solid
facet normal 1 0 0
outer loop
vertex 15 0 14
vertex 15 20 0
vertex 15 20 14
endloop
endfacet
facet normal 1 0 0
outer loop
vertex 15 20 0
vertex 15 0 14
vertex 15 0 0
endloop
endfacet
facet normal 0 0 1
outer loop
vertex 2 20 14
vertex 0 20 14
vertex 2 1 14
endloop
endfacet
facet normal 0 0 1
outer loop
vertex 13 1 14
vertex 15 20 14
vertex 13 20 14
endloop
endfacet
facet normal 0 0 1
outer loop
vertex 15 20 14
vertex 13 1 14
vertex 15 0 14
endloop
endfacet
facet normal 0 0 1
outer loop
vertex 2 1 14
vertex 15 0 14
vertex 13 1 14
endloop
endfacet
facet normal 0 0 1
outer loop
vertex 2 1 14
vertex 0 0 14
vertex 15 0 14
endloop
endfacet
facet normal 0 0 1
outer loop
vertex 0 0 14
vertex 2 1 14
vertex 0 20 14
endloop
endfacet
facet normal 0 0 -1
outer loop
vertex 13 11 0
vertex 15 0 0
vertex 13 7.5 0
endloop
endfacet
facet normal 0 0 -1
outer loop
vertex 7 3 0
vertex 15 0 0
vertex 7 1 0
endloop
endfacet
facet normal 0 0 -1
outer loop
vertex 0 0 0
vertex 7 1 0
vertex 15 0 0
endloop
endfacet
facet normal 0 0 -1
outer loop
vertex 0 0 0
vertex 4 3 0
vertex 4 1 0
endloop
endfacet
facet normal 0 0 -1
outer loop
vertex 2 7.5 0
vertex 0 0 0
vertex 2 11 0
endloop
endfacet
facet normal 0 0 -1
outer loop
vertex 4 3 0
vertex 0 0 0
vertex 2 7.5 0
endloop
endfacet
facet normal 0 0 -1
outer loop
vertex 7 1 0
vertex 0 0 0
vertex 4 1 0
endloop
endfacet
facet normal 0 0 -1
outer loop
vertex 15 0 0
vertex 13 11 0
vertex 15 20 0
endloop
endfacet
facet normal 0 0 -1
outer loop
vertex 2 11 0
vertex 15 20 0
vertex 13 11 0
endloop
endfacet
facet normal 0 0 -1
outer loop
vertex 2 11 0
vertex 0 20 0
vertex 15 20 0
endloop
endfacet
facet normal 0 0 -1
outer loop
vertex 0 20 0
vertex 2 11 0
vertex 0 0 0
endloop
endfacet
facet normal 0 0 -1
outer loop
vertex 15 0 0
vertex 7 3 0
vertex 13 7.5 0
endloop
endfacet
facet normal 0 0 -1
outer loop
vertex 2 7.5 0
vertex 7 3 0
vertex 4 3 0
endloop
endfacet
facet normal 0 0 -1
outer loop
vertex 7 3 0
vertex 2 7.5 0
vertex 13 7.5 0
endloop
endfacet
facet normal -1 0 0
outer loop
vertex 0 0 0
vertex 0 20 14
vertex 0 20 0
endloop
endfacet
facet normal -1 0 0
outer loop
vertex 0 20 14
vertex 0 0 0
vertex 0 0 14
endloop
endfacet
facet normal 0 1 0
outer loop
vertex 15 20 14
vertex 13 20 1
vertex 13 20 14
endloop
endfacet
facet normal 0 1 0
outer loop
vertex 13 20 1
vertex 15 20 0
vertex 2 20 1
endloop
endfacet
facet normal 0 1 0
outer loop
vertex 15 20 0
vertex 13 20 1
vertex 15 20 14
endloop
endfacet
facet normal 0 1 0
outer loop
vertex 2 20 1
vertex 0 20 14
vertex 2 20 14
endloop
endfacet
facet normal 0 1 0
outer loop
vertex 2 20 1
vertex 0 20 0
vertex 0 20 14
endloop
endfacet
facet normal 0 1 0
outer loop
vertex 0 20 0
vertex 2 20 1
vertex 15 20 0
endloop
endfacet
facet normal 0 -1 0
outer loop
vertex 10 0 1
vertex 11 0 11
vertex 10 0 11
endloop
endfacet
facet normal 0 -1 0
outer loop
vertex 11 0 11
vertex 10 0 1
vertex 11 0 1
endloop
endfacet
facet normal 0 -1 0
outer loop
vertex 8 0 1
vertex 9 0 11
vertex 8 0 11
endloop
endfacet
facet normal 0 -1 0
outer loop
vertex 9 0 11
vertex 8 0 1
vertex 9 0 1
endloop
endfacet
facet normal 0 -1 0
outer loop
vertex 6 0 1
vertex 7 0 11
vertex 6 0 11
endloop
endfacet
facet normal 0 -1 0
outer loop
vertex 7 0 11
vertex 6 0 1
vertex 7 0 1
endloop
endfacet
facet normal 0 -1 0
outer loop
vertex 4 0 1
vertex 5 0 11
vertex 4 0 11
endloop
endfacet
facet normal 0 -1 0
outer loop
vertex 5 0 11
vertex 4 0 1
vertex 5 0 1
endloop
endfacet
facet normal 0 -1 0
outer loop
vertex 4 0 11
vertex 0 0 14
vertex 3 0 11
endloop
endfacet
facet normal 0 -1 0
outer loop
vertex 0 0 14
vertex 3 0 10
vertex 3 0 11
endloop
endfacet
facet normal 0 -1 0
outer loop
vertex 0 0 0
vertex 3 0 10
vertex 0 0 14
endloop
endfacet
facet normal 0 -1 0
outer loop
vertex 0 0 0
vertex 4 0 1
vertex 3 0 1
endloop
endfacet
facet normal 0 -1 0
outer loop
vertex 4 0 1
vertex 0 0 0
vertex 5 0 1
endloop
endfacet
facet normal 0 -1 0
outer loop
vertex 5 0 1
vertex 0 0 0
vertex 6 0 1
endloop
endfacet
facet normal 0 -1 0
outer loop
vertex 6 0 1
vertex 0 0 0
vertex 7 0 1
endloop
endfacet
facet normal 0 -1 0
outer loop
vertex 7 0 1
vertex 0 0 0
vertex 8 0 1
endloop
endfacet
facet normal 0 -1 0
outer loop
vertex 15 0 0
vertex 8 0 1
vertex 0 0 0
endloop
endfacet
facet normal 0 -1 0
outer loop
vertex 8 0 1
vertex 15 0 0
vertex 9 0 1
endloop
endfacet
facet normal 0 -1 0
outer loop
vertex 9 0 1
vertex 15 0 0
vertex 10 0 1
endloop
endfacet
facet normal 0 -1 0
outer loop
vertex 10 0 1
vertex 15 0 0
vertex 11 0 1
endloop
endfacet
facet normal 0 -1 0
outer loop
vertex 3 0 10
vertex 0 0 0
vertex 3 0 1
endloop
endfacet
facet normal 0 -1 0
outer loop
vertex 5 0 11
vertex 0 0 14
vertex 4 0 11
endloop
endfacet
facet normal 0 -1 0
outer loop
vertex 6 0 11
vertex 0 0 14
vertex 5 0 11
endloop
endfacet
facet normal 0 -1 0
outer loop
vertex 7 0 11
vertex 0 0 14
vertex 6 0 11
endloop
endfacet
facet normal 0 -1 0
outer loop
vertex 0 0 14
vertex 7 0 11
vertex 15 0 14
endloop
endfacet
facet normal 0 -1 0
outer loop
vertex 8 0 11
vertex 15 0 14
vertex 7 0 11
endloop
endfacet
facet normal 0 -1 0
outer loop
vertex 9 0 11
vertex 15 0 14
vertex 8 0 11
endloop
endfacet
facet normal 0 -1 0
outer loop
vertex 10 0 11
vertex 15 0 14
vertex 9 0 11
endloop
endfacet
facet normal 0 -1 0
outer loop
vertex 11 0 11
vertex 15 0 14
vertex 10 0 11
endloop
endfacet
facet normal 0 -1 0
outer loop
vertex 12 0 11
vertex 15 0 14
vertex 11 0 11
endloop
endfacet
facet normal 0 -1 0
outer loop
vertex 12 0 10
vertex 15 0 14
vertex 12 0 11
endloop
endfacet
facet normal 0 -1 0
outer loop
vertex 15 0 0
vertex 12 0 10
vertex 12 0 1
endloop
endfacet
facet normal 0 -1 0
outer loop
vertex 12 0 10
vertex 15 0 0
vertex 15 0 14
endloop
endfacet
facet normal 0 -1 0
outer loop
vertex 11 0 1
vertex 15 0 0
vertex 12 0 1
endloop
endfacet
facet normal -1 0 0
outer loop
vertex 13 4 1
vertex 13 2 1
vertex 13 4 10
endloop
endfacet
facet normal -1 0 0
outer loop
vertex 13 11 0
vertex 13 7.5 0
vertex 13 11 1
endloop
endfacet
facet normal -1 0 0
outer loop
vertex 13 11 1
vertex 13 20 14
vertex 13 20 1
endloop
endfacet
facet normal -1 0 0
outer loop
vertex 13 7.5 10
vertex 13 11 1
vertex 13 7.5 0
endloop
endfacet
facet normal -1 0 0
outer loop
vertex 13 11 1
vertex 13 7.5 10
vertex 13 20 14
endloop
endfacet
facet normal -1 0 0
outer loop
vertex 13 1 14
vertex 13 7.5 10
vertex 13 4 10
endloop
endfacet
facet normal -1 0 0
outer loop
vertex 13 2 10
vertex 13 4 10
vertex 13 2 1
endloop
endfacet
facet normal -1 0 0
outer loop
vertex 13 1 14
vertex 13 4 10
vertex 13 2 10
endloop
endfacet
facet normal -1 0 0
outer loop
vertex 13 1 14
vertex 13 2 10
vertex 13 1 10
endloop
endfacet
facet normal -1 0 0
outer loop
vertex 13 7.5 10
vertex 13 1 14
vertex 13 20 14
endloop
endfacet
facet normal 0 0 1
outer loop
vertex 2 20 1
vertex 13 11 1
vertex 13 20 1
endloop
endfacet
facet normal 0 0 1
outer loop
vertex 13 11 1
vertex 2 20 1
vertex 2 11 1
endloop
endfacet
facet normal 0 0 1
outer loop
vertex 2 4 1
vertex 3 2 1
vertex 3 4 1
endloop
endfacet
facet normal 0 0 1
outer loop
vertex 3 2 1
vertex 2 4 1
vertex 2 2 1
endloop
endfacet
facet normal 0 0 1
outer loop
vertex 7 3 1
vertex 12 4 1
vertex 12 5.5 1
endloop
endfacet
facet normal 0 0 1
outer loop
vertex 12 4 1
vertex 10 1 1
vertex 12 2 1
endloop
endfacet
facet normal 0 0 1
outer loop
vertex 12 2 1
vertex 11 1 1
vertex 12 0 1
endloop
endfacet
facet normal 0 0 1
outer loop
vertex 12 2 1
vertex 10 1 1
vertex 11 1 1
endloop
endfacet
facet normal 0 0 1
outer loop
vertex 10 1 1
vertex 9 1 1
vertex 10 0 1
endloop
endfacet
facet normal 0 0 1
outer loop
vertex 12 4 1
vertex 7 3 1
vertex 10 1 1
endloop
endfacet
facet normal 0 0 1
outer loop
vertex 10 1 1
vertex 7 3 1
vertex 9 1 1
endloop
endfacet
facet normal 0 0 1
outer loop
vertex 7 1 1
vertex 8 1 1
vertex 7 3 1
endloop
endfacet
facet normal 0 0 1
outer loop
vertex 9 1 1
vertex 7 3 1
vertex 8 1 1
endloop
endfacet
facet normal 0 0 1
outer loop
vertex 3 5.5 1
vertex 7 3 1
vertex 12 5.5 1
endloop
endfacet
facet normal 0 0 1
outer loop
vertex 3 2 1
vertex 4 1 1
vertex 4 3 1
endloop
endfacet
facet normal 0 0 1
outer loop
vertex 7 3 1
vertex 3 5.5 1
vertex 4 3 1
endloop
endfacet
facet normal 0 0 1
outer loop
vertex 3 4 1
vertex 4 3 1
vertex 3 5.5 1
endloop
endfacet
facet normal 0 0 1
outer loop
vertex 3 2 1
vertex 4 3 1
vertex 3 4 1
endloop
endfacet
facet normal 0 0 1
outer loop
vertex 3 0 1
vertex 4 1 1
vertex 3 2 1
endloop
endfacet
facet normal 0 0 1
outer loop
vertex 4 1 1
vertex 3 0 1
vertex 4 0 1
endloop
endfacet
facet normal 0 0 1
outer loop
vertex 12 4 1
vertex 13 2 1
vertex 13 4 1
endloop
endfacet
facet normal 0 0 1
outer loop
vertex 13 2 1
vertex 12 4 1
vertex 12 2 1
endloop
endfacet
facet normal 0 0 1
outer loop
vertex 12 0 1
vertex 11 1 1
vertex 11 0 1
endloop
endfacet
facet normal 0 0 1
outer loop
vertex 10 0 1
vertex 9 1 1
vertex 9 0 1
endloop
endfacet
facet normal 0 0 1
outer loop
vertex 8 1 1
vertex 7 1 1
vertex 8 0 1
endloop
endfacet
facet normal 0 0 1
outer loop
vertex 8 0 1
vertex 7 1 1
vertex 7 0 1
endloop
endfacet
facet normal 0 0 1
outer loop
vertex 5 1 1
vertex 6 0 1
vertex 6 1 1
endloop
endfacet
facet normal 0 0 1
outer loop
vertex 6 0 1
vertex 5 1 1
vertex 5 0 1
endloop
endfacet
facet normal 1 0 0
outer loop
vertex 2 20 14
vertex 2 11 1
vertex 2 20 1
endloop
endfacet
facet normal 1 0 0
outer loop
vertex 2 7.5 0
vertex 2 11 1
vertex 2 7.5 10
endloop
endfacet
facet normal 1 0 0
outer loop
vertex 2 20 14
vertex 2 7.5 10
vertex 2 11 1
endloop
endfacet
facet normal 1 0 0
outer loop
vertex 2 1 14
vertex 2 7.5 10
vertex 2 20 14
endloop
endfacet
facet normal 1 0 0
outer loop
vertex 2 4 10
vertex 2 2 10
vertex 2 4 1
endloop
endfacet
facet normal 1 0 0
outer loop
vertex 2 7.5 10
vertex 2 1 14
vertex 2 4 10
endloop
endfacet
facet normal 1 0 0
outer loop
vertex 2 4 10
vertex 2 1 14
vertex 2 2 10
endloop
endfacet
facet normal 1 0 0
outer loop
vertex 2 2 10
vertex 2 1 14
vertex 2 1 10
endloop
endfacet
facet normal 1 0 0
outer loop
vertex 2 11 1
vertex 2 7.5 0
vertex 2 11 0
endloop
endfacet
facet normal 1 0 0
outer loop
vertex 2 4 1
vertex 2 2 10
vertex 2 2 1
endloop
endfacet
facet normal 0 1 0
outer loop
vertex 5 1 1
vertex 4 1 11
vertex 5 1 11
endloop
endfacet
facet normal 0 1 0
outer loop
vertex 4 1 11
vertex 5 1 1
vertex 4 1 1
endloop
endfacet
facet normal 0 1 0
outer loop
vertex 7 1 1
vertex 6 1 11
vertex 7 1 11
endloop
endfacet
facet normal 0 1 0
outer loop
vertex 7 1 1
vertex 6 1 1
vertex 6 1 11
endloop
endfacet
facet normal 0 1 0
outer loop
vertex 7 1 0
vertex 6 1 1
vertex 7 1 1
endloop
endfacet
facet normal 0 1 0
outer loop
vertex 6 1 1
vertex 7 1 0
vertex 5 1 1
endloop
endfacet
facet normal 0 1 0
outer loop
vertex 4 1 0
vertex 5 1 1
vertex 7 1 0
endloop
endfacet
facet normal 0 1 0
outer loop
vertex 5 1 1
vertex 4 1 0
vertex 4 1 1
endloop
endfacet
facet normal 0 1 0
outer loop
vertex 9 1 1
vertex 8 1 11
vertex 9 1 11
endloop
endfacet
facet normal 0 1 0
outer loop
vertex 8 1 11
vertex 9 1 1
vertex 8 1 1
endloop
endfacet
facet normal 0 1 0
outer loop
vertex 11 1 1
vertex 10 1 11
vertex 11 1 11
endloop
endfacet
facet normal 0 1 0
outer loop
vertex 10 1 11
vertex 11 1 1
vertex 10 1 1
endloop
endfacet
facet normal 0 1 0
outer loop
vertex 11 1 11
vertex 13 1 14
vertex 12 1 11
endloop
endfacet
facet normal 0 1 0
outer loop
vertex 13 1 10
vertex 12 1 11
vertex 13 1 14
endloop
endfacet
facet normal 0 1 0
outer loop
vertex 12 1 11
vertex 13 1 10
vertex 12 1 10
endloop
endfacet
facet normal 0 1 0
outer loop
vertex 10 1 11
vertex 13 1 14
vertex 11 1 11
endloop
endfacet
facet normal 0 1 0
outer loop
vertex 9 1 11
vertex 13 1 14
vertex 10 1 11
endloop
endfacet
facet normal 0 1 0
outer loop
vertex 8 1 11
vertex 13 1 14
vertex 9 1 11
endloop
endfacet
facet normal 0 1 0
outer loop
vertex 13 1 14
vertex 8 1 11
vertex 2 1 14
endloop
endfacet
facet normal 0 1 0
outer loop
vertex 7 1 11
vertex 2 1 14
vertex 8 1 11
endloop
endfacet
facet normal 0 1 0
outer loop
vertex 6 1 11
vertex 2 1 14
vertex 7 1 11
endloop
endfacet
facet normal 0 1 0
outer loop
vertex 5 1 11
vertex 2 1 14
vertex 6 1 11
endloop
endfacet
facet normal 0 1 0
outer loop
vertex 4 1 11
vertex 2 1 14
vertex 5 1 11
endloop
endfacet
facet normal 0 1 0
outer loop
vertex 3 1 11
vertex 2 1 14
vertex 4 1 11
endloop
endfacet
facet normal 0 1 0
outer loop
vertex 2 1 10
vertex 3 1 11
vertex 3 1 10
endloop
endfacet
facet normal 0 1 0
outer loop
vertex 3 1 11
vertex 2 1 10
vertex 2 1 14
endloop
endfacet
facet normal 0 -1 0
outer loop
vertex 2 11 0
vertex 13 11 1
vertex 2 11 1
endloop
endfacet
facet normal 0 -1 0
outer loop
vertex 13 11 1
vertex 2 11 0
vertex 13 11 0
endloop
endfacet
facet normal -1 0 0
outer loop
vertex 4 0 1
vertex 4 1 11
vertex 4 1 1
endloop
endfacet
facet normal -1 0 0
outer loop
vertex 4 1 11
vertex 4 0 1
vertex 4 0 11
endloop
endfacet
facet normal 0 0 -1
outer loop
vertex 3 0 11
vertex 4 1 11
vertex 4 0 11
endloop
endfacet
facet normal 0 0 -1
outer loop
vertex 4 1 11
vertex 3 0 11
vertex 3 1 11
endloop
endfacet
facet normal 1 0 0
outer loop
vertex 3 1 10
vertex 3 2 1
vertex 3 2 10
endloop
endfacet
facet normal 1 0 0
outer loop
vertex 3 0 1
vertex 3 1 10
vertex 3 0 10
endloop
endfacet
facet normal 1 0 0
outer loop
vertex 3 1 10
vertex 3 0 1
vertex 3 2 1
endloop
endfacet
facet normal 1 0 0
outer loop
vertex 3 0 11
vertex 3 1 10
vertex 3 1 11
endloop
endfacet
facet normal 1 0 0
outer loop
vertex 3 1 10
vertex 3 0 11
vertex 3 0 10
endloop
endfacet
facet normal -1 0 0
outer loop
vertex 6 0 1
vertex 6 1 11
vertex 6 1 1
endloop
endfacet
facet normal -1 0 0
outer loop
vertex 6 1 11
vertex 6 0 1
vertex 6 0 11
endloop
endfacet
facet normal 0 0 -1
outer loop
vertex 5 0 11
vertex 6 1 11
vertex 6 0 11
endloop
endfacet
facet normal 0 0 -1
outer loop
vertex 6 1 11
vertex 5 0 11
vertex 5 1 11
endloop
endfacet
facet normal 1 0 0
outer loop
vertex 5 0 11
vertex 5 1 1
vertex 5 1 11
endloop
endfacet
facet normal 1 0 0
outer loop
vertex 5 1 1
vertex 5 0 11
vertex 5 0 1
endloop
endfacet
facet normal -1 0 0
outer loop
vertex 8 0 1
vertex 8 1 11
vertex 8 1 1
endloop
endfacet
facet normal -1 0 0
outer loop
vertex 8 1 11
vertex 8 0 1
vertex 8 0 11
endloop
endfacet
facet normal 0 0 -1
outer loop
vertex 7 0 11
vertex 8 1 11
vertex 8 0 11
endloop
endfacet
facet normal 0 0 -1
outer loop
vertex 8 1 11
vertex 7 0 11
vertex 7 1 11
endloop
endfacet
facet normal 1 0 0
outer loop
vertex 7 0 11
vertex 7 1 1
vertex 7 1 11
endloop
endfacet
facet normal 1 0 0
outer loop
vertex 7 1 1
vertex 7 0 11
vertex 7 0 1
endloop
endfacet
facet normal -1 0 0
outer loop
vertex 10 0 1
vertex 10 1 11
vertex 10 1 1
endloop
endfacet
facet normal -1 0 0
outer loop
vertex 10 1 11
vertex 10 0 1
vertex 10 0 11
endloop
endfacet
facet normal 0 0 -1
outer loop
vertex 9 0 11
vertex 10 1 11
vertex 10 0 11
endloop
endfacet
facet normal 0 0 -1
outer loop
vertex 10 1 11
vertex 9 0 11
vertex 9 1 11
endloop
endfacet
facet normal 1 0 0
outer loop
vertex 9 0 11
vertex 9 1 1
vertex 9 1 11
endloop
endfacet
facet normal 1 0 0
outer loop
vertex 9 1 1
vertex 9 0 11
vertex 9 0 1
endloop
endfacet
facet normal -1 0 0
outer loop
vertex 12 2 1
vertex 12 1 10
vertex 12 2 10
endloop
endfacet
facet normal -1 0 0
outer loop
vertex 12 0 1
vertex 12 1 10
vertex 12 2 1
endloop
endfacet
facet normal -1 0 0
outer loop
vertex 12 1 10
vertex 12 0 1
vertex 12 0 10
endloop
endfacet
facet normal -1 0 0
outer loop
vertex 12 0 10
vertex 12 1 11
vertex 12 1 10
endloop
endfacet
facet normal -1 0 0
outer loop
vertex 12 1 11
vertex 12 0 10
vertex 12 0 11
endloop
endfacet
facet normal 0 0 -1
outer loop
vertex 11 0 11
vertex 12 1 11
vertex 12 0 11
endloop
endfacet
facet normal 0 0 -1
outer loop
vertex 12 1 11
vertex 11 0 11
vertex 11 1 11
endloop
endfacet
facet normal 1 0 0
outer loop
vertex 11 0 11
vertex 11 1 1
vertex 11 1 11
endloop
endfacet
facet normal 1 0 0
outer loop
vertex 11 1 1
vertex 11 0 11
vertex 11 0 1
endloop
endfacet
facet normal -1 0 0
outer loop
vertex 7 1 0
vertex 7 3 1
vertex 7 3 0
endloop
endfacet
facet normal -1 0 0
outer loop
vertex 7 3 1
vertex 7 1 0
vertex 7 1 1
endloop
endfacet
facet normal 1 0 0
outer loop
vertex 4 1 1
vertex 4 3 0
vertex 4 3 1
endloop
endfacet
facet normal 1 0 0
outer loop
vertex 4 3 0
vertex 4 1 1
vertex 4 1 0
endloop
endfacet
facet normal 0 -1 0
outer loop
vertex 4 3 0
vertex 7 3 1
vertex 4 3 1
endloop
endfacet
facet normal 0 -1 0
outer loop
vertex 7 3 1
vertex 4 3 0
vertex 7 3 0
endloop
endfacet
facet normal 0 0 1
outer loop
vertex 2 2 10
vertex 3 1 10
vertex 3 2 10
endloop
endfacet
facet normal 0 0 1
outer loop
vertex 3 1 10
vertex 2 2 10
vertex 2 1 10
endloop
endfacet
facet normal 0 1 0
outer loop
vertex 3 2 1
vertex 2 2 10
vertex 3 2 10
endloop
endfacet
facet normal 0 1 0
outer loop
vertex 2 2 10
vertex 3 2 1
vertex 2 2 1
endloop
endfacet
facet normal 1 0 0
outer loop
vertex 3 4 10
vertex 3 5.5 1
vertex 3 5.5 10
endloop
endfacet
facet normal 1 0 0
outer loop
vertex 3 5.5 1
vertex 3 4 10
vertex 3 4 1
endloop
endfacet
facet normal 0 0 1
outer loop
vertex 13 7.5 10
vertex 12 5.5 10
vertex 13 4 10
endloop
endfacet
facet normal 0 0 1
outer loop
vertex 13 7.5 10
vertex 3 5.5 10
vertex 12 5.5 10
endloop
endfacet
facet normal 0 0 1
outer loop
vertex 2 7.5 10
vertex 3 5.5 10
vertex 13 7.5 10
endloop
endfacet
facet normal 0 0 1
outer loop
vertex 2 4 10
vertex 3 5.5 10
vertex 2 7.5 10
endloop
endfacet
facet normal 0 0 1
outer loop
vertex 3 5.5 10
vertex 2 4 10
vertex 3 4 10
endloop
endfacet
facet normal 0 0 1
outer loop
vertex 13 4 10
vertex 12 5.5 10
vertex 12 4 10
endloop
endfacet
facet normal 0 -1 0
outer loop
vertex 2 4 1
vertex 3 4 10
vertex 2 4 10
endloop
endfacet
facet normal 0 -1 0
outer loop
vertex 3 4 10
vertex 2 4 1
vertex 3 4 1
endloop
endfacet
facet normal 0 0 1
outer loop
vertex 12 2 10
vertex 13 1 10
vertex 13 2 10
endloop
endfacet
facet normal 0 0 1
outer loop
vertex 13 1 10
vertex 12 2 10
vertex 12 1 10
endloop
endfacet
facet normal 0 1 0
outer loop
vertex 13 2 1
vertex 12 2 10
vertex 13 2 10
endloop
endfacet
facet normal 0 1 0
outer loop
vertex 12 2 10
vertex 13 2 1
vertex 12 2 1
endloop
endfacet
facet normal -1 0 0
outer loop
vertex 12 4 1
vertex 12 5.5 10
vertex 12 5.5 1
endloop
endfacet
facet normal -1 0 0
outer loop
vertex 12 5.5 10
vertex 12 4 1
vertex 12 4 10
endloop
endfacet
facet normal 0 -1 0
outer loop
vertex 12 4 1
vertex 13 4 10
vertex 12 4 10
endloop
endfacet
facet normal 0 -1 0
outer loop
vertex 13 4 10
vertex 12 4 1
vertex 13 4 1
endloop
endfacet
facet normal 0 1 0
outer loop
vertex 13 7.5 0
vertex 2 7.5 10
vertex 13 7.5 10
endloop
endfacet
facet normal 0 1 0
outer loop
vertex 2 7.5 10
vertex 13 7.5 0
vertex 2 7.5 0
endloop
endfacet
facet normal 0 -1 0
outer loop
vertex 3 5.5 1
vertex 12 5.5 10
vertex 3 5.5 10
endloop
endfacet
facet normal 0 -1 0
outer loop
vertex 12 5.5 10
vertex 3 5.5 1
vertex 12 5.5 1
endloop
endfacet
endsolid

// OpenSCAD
difference()
{
    cube([15,20,14]);
    translate([2,1,1]) cube([11,20,13.15]);
    color("blue") translate([2,7,0]) cube([11,4,13.15]);

color("blue") translate([3,-1,1]) cube([1,5,10]);
    color("blue") translate([5,-1,1]) cube([1,5,10]);
    color("blue") translate([7,-1,1]) cube([1,5,10]);
    color("blue") translate([9,-1,1]) cube([1,5,10]);
    color("blue") translate([11,-1,1]) cube([1,5,10]);
    color("orange") translate([4,1,0]) cube([3,2,3]);
}
color("red") cube([3,2,10]);
color("red") translate([1,4,0]) cube([2,2,10]);
color("red") translate([12,0,0]) cube([2,2,10]);
color("red") translate([12,4,0]) cube([2,2,10]);
translate([0,5.5,0]) cube([13,2,10]);


// Tall 13.15
// Width 10.47
// thick 1.67
